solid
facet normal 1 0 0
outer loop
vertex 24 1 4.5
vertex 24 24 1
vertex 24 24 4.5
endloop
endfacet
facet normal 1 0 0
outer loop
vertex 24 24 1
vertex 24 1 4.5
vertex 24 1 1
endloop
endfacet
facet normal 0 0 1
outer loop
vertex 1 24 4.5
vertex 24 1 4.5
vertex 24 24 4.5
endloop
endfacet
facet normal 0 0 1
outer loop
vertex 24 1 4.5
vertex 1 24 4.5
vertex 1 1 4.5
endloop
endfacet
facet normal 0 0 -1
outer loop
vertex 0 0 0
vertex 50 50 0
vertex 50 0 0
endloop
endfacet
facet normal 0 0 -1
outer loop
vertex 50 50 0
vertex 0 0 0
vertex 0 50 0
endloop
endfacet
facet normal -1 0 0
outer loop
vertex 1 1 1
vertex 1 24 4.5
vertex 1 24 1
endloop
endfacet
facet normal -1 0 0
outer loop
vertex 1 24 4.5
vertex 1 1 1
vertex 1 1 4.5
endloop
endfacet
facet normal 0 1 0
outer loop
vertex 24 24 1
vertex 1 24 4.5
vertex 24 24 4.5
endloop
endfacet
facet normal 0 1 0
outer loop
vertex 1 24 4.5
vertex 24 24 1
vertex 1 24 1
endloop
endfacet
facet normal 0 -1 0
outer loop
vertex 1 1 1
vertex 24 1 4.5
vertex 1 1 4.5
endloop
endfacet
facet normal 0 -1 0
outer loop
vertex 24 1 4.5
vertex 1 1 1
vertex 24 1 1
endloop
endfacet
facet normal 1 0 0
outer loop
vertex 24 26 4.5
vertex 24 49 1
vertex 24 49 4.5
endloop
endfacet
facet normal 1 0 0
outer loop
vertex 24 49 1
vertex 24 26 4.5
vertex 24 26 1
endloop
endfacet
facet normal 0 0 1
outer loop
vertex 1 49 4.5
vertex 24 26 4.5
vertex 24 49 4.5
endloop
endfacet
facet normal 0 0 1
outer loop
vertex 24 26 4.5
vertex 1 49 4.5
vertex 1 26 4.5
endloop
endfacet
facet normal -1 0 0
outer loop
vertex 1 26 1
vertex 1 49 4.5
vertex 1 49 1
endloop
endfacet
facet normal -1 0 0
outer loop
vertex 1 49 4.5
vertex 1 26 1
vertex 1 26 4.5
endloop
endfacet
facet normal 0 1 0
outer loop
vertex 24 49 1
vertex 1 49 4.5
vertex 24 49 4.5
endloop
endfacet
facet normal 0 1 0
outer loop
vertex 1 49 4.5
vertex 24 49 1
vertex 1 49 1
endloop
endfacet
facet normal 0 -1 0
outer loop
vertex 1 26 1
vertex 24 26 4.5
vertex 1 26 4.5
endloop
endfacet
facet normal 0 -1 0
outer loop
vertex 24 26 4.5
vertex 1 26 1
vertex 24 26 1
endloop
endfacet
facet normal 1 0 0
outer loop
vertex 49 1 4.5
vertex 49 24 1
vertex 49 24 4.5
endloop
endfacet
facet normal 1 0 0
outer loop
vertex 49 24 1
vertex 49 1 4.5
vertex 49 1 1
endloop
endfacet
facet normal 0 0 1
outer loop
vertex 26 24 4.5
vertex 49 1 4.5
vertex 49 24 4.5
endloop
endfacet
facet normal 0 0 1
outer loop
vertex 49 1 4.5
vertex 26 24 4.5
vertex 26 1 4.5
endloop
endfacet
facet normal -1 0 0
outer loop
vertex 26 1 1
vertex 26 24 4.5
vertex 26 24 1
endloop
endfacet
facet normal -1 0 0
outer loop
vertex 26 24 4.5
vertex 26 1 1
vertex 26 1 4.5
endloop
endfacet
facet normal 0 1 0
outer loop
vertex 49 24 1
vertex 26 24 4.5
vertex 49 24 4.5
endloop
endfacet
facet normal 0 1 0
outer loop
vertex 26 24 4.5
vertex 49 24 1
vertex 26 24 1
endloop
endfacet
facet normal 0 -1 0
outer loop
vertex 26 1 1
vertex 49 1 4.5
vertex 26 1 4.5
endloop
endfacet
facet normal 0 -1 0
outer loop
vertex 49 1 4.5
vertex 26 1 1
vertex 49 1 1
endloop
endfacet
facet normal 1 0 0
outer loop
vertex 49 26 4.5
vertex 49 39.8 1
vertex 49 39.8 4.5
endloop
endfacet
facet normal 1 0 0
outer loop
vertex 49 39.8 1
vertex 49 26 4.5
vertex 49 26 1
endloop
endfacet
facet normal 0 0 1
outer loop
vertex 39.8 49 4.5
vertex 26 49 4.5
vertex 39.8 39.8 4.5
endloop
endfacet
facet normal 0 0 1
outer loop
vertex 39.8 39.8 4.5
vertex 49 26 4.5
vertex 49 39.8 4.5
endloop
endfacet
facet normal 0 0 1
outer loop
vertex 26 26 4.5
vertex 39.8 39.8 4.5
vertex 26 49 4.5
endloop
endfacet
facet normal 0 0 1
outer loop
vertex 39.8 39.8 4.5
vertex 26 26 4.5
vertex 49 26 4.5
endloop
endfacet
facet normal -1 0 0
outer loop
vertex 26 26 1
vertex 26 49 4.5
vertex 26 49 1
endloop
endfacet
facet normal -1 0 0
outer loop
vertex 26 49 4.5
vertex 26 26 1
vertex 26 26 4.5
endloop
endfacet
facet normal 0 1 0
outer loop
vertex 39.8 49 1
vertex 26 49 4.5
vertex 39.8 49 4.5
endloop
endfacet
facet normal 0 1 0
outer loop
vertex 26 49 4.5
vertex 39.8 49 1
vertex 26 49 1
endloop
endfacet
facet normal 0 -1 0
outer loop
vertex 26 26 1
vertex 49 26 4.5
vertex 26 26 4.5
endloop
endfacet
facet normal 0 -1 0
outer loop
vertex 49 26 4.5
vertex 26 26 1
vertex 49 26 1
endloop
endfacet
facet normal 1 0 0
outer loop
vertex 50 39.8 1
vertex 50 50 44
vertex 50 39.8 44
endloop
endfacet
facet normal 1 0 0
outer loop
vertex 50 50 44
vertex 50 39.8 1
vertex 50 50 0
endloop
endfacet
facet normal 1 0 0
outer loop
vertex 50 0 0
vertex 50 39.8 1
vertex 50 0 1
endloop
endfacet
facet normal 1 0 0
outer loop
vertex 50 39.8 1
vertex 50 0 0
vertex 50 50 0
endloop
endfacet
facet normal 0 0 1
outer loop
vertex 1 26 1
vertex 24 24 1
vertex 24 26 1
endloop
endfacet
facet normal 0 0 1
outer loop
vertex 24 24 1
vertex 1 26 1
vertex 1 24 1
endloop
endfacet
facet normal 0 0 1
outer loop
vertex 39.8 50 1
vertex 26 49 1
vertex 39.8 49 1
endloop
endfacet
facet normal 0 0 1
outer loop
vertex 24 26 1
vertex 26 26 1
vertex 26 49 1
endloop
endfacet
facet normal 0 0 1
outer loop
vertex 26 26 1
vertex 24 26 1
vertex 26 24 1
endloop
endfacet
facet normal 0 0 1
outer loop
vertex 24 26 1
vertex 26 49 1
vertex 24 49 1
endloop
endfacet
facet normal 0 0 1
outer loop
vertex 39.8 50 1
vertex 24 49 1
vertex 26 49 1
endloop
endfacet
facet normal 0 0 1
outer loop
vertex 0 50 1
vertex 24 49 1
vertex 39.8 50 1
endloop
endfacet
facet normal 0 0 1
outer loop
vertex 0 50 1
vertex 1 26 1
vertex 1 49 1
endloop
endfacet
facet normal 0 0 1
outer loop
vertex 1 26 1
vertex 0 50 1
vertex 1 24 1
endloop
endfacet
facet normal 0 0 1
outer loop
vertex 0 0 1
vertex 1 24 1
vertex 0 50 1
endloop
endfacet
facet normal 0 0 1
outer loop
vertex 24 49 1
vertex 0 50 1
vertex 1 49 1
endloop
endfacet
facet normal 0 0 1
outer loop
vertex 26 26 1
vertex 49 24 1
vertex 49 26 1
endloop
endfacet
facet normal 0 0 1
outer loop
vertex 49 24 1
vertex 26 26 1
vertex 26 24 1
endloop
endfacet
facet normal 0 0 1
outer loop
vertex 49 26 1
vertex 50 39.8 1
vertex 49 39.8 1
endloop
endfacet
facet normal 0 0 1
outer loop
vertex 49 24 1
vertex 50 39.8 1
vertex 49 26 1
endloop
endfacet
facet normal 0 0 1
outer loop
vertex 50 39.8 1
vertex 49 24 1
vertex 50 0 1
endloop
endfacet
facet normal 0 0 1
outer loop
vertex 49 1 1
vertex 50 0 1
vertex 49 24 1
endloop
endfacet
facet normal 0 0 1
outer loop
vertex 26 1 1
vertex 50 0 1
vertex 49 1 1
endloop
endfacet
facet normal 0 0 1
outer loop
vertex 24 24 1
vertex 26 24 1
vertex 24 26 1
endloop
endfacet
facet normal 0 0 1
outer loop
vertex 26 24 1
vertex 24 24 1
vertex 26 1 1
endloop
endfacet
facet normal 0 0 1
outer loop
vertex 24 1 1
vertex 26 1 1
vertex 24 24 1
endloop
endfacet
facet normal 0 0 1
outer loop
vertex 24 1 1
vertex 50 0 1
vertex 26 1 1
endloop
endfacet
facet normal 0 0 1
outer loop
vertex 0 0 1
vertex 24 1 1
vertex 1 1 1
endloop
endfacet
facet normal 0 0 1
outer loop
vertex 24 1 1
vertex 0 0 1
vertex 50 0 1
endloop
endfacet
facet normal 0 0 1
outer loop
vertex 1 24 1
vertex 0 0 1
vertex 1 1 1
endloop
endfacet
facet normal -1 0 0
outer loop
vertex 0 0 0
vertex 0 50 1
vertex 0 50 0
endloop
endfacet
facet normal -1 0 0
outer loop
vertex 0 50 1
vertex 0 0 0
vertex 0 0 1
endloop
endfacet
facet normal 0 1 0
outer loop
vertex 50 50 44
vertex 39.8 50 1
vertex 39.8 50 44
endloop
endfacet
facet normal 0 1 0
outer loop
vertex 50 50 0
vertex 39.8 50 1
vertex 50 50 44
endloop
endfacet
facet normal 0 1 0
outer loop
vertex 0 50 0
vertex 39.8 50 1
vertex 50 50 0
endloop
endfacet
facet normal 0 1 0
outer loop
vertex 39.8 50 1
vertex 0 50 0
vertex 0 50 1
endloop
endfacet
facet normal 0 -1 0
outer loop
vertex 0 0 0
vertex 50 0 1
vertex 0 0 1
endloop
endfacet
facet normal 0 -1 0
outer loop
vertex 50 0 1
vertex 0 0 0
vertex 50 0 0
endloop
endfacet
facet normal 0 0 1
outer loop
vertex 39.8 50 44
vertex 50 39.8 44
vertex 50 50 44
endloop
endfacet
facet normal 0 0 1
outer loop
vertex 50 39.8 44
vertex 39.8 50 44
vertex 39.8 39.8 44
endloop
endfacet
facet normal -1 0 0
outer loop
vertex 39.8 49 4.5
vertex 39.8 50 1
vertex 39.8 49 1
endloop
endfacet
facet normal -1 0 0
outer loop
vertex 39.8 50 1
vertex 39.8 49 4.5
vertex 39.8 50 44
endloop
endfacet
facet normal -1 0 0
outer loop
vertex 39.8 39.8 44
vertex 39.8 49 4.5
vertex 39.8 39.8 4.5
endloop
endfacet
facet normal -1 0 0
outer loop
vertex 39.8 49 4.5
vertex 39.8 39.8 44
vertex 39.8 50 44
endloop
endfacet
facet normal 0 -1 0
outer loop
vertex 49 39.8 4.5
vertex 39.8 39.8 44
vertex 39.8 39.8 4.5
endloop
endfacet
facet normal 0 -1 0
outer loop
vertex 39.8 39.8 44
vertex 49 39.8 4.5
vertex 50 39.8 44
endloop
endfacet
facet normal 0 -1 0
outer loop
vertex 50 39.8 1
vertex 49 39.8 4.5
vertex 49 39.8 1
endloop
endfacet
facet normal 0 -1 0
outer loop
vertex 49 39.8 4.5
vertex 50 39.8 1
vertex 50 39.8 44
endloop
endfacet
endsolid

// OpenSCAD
_basis = 25;

module pillar(x=2, y=2, h=2, base=false) {
    base_buffer = base ? 6 : 0;
    translate([0,0,base_buffer]) color("LightGray") {

        for (i = [0:x-1]) {
            for (j = [0:y-1]) {
                translate([_basis*i+1,_basis*j+1,0]) cube([23,23,4.5]);
            }
        }
    }

    color("Grey") {
        cube([_basis*x,_basis*y,1+base_buffer]);
        translate([_basis*x-10.2,_basis*y-10.2,0]) cube([10.2,10.2,_basis*h-6+base_buffer]);
    }
}

pillar(x=2, y=2, h=2, base=false);
